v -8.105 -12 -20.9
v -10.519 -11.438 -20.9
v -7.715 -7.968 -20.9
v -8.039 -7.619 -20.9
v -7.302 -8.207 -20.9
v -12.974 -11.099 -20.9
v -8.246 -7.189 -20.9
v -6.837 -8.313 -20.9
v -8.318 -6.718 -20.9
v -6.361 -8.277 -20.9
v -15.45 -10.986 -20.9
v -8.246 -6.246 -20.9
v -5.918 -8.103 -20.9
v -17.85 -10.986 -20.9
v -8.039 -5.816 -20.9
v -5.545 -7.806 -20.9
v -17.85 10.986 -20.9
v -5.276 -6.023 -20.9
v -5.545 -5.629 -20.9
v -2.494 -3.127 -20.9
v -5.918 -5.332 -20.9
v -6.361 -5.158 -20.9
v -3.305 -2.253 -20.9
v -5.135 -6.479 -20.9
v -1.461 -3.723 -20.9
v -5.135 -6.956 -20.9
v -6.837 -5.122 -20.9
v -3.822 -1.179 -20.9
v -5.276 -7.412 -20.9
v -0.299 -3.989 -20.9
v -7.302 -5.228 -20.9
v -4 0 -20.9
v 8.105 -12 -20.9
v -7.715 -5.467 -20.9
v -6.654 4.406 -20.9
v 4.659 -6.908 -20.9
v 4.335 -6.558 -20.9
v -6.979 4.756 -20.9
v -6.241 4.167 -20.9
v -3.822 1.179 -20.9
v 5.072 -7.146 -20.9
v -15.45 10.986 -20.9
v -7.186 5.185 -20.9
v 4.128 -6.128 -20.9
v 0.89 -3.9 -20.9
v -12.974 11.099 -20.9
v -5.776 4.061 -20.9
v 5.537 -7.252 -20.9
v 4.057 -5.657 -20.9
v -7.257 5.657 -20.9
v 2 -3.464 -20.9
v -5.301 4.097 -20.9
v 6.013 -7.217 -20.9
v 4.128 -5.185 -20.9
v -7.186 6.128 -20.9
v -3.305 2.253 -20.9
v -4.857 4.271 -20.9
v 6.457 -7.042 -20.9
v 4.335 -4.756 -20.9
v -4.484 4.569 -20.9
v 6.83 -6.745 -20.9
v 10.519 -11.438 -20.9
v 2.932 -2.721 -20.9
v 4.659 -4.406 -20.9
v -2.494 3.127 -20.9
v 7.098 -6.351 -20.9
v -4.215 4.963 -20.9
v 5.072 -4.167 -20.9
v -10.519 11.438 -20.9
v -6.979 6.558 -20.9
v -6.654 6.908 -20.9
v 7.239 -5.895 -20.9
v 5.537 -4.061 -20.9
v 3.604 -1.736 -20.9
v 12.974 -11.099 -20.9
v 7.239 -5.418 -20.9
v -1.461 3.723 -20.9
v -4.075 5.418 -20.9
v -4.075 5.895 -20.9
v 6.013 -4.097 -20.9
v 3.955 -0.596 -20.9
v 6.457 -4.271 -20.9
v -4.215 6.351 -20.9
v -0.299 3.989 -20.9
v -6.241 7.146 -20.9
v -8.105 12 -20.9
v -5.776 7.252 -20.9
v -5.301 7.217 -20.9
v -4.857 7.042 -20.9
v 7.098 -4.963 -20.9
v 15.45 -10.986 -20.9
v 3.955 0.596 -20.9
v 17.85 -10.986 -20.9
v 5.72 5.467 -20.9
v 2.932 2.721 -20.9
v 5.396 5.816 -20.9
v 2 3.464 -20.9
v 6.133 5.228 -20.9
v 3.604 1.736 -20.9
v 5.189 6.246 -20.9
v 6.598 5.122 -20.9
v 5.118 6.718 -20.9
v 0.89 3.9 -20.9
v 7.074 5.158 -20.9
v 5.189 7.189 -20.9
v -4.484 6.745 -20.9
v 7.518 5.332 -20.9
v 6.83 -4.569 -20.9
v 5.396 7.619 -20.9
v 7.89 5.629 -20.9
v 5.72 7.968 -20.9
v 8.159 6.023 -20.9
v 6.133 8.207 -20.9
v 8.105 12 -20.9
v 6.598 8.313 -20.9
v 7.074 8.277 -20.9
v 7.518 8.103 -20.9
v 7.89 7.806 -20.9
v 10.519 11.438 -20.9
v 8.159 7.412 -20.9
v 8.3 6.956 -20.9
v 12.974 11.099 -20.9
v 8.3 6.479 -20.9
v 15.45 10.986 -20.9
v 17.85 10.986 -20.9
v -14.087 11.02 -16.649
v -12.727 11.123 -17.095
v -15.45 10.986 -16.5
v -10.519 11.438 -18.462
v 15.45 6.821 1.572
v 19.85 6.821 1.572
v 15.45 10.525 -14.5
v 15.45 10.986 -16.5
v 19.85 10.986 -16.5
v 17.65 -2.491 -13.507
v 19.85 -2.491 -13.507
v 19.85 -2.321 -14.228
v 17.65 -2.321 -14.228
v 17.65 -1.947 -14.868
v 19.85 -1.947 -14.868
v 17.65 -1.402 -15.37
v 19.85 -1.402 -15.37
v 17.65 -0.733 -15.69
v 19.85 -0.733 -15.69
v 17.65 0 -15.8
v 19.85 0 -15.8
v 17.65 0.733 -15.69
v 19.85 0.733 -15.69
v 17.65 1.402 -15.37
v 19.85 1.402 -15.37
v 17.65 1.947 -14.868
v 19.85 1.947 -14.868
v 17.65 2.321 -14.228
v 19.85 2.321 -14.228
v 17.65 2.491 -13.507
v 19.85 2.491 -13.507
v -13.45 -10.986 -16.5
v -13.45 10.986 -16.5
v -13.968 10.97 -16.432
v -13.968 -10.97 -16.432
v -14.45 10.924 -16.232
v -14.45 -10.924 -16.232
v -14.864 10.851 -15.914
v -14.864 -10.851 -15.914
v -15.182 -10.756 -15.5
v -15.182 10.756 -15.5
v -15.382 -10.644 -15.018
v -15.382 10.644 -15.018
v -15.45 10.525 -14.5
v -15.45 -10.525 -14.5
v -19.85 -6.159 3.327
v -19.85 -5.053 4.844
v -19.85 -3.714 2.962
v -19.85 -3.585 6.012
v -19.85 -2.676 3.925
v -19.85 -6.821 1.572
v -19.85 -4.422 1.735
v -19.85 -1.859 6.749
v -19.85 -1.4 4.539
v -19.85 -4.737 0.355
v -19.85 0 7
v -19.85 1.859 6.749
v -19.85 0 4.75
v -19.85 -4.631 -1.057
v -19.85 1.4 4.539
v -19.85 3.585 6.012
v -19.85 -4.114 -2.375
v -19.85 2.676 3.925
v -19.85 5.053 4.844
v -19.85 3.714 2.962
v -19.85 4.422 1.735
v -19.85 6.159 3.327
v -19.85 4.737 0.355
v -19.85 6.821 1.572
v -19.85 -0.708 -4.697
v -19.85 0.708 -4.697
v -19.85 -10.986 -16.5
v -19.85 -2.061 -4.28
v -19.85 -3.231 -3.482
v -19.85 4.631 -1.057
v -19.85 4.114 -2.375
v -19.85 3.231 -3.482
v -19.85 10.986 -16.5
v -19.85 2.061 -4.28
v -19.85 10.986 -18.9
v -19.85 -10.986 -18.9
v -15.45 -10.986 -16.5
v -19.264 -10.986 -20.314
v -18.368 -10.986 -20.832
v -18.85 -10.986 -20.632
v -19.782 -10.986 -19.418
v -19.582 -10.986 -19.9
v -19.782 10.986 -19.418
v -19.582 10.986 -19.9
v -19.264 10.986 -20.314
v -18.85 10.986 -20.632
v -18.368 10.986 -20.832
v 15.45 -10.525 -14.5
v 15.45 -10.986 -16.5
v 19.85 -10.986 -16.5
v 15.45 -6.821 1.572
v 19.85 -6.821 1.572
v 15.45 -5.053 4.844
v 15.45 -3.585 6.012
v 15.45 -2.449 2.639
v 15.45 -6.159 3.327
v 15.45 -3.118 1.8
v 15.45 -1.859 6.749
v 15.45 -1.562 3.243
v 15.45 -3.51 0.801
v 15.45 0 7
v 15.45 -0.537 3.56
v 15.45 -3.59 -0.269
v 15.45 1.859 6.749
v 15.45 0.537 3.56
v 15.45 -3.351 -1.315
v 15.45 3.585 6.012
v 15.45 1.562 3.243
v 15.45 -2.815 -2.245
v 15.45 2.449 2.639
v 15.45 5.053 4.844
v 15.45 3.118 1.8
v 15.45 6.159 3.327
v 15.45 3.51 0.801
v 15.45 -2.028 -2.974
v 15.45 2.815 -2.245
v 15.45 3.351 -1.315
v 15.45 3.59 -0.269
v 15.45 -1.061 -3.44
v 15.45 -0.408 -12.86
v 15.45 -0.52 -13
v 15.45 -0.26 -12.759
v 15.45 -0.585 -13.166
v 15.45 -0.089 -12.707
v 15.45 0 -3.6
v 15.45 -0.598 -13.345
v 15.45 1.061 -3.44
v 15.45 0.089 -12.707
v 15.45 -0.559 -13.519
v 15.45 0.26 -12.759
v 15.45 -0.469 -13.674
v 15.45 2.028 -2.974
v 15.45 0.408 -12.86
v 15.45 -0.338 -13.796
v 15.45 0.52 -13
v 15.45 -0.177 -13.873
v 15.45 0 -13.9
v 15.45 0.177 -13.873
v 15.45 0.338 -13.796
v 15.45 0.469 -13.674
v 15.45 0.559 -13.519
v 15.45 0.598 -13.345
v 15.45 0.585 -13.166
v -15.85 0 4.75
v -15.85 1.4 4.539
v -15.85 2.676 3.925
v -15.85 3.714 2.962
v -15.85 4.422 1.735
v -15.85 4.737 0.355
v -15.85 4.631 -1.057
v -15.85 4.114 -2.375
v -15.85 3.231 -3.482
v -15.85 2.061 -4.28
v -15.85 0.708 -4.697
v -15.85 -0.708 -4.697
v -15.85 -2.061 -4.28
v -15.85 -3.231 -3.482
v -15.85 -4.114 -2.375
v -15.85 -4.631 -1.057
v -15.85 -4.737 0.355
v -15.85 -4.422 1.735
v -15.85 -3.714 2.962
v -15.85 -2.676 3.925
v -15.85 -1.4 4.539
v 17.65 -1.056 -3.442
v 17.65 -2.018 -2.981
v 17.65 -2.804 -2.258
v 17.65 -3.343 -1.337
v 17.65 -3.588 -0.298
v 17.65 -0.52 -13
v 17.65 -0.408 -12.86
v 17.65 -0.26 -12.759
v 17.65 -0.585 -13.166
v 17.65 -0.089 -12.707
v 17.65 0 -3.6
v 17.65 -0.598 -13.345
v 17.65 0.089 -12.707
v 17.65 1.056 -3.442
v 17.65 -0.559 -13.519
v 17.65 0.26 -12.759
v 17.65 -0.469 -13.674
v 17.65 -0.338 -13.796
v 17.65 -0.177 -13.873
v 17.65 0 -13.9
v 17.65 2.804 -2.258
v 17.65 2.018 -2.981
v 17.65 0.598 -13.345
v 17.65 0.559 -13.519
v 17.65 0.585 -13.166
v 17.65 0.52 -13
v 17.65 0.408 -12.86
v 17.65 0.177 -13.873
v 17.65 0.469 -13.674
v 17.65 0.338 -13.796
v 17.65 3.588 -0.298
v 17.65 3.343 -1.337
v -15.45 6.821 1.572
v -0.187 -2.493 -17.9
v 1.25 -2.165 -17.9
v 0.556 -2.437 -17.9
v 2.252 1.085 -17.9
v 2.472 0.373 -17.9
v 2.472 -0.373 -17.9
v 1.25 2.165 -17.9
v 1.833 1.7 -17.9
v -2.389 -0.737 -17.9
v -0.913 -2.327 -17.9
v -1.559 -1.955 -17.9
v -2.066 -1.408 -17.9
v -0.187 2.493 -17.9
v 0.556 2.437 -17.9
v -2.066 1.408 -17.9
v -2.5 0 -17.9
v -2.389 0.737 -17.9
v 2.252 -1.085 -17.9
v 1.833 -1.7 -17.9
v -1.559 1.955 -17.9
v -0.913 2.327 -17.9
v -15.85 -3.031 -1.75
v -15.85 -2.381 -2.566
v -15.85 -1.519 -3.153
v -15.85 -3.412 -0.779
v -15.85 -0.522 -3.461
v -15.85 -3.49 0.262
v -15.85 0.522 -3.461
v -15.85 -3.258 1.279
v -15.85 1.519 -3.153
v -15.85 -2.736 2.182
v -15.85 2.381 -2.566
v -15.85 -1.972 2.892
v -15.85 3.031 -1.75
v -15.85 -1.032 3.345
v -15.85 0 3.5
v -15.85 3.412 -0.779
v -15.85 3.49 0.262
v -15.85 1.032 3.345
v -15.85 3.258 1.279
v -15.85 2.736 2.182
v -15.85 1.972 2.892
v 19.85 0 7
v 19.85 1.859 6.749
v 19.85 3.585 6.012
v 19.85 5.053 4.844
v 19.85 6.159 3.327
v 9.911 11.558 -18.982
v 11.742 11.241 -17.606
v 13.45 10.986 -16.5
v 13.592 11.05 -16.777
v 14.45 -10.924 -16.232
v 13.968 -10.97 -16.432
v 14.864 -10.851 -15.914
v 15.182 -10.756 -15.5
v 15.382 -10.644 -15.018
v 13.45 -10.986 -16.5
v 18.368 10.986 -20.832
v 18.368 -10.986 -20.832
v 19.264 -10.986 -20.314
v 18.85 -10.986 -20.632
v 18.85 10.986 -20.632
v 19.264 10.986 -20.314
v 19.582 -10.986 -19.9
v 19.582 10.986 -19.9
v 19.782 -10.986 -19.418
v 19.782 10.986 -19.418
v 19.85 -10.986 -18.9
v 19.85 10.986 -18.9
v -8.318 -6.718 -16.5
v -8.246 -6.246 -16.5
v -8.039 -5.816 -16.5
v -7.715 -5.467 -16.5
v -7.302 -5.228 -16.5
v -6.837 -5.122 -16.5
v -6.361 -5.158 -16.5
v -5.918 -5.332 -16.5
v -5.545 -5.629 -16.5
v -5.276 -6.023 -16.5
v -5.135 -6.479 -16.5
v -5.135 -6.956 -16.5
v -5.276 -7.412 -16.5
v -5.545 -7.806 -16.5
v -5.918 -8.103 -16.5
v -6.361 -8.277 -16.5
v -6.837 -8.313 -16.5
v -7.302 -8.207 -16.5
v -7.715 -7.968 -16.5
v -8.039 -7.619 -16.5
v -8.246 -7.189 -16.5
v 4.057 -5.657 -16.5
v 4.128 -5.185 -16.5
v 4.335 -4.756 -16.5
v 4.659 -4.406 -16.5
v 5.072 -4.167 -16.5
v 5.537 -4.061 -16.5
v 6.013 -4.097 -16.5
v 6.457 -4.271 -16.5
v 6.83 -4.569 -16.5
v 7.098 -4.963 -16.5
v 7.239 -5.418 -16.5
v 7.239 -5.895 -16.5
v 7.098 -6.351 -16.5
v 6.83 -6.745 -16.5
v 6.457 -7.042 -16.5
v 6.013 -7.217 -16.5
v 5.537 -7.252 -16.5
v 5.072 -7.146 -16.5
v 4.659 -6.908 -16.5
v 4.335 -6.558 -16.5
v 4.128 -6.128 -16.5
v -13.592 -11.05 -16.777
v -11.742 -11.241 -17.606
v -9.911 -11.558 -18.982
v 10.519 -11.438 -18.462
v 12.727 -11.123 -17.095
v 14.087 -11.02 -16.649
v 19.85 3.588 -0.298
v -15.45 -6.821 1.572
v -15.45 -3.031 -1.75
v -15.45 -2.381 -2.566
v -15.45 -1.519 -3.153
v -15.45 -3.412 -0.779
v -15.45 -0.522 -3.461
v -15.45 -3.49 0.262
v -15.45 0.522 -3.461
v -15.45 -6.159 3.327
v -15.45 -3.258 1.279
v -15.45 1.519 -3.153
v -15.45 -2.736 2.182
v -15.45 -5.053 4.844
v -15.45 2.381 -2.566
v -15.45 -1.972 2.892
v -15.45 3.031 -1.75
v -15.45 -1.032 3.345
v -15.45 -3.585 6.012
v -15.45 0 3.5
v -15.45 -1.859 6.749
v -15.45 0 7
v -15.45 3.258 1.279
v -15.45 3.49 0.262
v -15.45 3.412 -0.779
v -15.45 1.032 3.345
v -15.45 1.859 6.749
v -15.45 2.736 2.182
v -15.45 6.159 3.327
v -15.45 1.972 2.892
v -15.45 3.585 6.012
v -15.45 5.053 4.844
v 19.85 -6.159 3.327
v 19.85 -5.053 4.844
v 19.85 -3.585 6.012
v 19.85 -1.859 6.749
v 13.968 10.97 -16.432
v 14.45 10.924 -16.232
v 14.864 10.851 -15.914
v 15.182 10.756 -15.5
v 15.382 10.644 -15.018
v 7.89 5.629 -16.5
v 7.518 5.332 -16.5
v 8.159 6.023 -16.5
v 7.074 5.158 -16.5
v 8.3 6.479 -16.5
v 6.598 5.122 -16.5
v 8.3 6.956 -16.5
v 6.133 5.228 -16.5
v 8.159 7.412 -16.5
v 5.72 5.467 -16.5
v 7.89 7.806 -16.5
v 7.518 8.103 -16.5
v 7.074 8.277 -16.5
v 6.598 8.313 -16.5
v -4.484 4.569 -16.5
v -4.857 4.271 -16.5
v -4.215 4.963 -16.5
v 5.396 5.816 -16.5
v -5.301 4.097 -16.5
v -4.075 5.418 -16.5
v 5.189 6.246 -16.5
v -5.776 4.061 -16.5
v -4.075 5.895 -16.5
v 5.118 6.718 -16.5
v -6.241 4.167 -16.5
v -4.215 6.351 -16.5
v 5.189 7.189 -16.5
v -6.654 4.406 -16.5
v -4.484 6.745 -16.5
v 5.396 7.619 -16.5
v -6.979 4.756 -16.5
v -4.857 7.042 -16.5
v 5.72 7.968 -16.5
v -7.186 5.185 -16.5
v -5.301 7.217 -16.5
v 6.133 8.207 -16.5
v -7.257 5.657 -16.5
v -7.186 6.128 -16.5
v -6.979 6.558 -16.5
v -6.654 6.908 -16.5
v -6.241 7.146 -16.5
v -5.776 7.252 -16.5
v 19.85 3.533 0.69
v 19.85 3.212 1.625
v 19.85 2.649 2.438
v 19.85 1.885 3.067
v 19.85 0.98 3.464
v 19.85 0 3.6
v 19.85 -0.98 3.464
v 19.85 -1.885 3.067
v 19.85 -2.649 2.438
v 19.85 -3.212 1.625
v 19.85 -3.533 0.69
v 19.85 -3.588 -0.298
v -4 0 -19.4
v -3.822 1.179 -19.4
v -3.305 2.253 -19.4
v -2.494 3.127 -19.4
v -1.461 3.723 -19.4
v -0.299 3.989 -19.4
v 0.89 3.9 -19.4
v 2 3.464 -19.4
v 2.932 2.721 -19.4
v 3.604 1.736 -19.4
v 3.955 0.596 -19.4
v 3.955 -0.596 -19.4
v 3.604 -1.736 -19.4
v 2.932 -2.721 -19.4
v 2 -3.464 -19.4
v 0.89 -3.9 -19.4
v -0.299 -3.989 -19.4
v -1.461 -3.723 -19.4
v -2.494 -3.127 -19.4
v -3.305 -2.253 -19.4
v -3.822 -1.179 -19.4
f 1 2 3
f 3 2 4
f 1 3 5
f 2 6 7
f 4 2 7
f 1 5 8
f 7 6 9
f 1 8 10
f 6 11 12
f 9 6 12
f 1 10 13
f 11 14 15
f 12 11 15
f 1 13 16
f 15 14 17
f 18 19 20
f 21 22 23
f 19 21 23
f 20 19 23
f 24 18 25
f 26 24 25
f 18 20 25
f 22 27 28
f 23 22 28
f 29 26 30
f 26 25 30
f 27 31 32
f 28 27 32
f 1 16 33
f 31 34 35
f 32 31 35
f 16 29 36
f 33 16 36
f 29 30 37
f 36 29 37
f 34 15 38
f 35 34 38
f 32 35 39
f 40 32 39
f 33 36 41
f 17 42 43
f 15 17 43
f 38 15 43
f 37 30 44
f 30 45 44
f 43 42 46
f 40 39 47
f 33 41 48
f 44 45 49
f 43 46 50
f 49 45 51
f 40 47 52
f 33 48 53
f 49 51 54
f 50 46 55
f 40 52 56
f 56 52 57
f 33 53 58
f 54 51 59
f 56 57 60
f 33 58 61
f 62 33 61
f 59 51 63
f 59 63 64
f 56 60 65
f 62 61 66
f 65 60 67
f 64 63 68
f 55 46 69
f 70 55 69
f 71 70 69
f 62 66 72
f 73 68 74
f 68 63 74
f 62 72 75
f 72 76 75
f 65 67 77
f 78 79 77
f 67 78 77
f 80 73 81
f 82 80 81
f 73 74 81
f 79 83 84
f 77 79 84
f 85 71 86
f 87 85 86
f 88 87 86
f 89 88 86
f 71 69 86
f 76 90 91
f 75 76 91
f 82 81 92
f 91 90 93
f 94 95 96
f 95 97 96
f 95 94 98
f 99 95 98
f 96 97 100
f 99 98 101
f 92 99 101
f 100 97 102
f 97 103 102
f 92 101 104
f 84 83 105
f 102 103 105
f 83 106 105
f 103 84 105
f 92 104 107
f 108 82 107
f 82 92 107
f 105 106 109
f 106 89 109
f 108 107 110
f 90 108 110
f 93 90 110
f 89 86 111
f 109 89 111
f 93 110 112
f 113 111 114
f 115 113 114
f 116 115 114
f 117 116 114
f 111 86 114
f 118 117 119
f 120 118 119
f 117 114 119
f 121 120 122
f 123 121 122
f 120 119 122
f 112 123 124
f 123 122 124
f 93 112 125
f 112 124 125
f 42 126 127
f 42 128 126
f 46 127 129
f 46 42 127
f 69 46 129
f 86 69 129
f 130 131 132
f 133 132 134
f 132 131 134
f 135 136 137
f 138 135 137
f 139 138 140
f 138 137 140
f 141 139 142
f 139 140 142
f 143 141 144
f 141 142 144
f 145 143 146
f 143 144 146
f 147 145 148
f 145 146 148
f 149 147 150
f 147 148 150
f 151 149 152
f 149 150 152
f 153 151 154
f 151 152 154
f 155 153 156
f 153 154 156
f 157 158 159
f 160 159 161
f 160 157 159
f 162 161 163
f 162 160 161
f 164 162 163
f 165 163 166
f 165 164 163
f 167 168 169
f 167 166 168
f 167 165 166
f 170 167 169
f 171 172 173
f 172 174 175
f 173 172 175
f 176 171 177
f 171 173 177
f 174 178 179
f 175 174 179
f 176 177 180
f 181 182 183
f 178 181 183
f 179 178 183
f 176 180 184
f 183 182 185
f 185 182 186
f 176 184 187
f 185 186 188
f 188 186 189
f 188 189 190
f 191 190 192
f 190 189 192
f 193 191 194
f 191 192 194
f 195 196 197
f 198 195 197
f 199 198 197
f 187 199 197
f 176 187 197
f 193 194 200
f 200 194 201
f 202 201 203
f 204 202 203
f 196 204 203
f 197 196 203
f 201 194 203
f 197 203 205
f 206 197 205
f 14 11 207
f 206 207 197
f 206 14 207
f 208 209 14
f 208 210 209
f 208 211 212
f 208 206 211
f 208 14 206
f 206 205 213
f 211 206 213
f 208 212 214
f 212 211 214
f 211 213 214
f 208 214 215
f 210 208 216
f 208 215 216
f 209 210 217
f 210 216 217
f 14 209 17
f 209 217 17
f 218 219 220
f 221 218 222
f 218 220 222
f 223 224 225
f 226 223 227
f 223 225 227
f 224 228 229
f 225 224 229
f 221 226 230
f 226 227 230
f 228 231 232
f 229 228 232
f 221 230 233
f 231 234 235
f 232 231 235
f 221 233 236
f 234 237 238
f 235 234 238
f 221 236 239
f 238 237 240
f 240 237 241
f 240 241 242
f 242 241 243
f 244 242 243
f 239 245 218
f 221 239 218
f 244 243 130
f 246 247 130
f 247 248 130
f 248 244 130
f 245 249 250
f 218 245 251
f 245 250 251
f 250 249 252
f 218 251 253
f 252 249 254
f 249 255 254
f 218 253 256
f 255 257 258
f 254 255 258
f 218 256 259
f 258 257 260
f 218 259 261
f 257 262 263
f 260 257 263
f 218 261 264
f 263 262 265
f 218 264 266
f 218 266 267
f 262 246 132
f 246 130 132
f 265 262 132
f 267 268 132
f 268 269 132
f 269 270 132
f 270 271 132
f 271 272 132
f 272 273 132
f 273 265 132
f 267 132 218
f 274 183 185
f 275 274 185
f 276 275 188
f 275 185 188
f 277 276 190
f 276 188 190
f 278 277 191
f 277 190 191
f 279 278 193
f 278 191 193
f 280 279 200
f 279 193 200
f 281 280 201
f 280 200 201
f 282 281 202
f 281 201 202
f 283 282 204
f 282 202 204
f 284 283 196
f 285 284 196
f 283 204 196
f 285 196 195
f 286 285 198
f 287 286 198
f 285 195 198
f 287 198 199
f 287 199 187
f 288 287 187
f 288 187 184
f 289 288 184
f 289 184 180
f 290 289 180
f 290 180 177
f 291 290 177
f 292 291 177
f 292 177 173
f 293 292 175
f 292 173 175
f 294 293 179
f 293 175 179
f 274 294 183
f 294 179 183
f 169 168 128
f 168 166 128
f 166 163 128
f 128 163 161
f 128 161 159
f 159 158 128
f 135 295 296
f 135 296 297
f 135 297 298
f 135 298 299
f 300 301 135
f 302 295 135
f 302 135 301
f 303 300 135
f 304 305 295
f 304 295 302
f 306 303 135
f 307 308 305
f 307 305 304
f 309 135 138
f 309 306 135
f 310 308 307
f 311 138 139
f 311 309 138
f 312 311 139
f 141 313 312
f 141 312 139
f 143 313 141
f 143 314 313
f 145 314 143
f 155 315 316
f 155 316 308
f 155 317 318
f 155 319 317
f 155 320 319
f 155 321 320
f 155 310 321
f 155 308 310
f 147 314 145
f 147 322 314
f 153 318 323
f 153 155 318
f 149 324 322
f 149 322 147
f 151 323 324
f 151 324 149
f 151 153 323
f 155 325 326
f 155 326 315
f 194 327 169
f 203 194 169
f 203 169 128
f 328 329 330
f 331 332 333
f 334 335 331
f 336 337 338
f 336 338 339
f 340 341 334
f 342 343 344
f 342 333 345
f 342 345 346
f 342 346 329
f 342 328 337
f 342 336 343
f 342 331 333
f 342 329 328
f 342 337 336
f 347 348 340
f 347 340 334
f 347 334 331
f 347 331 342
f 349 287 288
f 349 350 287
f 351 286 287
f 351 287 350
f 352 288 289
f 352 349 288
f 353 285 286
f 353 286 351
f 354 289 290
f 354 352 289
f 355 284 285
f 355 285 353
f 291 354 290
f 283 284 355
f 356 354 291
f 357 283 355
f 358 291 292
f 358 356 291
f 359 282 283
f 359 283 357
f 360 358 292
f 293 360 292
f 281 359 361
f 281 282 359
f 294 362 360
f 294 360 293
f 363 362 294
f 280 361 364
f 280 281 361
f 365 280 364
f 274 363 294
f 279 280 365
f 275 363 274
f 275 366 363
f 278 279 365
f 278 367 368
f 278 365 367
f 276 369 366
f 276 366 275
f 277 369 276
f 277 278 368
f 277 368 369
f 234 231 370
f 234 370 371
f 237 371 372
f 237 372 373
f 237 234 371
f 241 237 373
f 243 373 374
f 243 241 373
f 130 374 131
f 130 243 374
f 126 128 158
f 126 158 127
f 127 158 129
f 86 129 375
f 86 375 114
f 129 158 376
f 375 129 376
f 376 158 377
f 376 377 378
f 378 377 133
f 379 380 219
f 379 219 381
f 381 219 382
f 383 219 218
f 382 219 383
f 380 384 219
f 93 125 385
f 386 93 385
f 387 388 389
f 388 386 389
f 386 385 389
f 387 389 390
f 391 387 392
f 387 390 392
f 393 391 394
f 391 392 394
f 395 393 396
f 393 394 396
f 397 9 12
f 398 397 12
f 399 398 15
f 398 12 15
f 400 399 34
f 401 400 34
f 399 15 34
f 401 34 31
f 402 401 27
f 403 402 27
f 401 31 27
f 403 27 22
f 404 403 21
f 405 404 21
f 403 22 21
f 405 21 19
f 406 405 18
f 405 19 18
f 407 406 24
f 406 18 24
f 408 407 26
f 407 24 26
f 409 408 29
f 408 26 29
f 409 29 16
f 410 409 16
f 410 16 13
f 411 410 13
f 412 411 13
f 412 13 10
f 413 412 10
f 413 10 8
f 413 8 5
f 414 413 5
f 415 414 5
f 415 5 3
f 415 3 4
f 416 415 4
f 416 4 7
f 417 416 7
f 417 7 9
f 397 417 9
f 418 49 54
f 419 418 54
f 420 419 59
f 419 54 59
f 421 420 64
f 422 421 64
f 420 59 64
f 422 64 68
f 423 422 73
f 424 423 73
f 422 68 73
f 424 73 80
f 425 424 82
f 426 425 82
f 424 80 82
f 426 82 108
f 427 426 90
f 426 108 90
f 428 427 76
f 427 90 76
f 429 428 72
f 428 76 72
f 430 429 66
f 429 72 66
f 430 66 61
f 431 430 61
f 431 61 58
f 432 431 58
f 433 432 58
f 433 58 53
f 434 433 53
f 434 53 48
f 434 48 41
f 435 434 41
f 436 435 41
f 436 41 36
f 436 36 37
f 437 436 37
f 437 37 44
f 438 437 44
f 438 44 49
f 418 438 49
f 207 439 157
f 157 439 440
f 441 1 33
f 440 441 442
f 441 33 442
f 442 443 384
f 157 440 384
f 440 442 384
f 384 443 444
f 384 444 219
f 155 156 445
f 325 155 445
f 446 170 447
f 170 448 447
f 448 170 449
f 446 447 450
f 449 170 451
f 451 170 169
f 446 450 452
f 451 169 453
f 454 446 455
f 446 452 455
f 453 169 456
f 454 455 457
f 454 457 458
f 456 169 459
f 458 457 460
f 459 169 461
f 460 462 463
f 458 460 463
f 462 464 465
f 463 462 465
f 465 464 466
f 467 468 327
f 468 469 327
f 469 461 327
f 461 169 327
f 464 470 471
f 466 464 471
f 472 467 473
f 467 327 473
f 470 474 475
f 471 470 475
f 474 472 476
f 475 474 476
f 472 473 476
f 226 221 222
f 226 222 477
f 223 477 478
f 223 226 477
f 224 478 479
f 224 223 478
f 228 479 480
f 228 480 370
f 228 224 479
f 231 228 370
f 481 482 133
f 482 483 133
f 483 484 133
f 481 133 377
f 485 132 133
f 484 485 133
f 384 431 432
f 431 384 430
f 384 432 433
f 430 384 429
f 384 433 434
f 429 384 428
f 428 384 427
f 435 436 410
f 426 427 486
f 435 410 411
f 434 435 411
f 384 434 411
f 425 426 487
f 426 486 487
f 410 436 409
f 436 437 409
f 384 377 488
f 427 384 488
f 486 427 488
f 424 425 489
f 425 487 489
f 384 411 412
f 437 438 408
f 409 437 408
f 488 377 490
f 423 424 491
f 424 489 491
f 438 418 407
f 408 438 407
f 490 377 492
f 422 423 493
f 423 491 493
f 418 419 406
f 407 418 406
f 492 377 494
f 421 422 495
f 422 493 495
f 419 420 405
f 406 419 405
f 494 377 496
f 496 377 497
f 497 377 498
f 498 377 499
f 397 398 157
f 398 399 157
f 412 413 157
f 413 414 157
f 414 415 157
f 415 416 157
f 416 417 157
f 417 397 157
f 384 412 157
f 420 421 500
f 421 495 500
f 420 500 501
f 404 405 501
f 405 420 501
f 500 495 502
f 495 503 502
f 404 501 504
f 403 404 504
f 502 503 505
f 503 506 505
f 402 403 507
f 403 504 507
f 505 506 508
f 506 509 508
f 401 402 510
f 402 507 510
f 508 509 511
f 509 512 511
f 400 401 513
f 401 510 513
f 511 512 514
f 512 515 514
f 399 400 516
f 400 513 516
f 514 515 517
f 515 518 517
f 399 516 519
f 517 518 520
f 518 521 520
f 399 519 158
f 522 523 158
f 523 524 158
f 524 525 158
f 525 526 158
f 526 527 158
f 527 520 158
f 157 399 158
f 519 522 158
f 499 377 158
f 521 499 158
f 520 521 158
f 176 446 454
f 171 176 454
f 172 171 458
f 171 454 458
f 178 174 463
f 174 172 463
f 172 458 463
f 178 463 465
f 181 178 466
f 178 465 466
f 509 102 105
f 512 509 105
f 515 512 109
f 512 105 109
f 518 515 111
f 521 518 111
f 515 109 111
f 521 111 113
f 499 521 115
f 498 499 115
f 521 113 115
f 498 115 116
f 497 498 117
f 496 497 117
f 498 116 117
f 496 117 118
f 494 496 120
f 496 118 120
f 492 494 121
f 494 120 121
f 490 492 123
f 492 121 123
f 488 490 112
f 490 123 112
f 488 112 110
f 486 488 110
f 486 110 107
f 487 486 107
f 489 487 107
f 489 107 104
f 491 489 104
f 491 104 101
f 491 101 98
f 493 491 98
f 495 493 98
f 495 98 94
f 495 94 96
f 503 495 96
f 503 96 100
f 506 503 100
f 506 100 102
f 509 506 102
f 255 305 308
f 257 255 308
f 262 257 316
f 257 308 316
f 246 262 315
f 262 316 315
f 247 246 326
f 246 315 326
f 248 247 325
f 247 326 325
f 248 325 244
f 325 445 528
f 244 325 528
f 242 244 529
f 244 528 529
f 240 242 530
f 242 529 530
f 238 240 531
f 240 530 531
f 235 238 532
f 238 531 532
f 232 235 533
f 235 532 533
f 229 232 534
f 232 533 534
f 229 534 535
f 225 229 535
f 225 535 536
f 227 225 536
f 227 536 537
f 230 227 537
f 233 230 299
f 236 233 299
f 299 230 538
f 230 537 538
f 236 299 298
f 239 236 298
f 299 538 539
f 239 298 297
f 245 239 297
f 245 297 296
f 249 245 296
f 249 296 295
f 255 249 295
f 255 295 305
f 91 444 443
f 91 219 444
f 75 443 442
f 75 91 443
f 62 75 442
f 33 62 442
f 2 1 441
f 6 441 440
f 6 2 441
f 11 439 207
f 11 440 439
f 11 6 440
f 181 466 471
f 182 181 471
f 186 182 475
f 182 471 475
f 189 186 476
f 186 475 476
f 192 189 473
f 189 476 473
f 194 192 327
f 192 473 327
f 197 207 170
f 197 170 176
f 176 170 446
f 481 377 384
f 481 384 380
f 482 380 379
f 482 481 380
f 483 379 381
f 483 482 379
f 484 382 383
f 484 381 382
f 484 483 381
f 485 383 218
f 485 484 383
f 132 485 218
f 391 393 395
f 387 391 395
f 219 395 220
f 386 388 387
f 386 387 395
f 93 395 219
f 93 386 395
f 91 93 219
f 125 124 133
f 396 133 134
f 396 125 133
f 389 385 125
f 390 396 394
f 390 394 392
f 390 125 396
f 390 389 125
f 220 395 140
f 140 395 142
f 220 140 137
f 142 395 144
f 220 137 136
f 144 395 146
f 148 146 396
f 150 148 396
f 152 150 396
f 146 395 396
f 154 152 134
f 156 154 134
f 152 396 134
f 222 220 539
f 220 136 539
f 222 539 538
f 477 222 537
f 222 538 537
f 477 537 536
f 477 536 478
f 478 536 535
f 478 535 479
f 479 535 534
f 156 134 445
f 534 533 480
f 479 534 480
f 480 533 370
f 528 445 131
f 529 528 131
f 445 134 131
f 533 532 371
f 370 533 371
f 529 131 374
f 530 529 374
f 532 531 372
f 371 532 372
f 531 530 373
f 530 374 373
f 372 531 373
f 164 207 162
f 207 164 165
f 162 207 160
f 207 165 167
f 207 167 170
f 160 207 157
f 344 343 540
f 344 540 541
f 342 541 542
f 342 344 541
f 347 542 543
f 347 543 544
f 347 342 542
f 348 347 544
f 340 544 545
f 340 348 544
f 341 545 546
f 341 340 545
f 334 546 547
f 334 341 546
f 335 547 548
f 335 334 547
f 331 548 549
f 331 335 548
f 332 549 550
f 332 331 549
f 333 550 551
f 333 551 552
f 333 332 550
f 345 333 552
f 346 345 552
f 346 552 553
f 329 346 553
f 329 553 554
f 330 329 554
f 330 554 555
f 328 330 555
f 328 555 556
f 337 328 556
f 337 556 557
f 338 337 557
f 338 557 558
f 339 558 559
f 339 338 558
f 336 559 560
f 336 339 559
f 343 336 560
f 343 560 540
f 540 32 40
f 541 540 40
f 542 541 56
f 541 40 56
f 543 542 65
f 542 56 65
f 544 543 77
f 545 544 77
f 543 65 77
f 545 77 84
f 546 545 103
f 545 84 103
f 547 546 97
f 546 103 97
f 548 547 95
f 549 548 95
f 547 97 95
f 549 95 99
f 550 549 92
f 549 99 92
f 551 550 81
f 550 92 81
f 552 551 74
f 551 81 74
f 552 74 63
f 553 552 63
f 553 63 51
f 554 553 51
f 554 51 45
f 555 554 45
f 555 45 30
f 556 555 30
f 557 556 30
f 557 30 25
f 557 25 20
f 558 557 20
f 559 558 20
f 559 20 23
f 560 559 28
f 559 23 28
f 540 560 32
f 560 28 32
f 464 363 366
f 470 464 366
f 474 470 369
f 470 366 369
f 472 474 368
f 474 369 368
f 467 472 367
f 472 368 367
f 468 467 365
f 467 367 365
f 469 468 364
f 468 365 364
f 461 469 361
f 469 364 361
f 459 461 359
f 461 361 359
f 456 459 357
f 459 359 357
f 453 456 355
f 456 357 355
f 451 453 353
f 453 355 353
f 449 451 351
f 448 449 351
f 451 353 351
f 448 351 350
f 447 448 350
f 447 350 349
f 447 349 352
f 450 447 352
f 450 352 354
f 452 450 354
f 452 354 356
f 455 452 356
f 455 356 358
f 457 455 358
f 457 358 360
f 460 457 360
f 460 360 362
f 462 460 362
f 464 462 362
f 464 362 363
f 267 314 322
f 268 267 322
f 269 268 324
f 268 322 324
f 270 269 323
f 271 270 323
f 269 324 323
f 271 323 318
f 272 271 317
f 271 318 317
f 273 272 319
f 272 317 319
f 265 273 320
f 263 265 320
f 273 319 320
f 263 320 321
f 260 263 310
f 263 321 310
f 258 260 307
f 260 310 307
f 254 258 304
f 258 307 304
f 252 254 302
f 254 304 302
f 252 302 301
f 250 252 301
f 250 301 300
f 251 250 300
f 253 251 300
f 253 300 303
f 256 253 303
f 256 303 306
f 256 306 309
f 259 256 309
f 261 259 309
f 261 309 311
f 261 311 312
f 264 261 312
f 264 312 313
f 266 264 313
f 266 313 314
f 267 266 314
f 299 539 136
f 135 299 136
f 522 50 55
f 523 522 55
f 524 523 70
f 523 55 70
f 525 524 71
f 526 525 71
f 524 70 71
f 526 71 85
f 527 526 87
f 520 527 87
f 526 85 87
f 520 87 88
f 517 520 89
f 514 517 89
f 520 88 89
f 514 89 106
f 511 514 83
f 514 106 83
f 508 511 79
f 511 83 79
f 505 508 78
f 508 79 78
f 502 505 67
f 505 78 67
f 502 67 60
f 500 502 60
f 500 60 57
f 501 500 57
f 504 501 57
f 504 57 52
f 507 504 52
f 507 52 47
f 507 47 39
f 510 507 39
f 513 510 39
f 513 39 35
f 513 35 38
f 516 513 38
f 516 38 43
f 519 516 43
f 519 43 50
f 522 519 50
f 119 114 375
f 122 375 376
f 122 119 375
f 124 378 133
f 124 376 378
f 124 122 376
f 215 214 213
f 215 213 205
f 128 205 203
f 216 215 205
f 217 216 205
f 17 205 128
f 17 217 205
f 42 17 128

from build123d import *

# Parameters (mm, degrees)
Y_KSEKLIK_EKSTR_ZYON1_DEPTH = 14
KES_EKSTR_ZYON1_DEPTH       = 33.044227249
KES_EKSTR_ZYON3_DEPTH       = 33.044227249
KES_EKSTR_ZYON4_START       = -4.4
KES_EKSTR_ZYON4_DEPTH       = 4.4
KES_EKSTR_ZYON6_REACH       = 48.442
IZIM6_R                     = 3.6
IZIM5_R                     = 1.6
KES_EKSTR_ZYON5_DEPTH       = 37.282674929
KES_EKSTR_ZYON7_DEPTH       = 2.2
KES_EKSTR_ZYON8_REACH       = 46.576
IZIM7_R                     = 0.6
KES_EKSTR_ZYON10_REACH      = 48.442
IZIM9_R                     = 3.5
IZIM9_3_R                   = 4.75
IZIM9_3_R_2                 = 3.5
KES_EKSTR_ZYON11_DEPTH      = 4
RADYUS1_R                   = 2
IZIM5_3_R                   = 4
KES_EKSTR_ZYON12_DEPTH      = 3
PAH1_SIZE                   = 1.5


# Read off the part's stored shape, not the designer's step: Kes-Ekstrüzyon4
with BuildPart() as part:
    # Çizim1 → Yükseklik-Ekstrüzyon1 (new, symmetric)
    with BuildSketch(Plane(origin=(0, 0, 0), x_dir=(1, 0, 0), z_dir=(0, 1, 0))):
        Polygon((-19.85, -7), (-19.85, 20.9), (19.85, 20.9), (19.85, -7), (15.45, -7), (15.45, 16.5), (-15.45, 16.5), (-15.45, -7), align=None)
    extrude(amount=Y_KSEKLIK_EKSTR_ZYON1_DEPTH, both=True)

    # Çizim2 → Kes-Ekstrüzyon1 (cut, through all)
    with BuildSketch(Plane(origin=(0, 0, 0), x_dir=(0, 0, -1), z_dir=(1, 0, 0))):
        with BuildLine():
            Line((20.9, -12), (-1.571984828, -6.821206909))
            ThreePointArc((-1.571984828, -6.821206909), (-5.477403299, -4.358675613), (-7, 0))
            Line((-7, 0), (-7, -14))
            Line((-7, -14), (20.9, -14))
            Line((20.9, -14), (20.9, -12))
        make_face()
        with BuildLine():
            Line((-7, 14), (-7, 0))
            ThreePointArc((-7, 0), (-5.477403299, 4.358675613), (-1.571984828, 6.821206909))
            Line((-1.571984828, 6.821206909), (20.9, 12))
            Line((20.9, 12), (20.9, 14))
            Line((20.9, 14), (-7, 14))
        make_face()
    extrude(amount=-KES_EKSTR_ZYON1_DEPTH, mode=Mode.SUBTRACT)

    # Çizim3 → Kes-Ekstrüzyon3 (cut, through all)
    with BuildSketch(Plane(origin=(0, 0, 0), x_dir=(0, 0, -1), z_dir=(1, 0, 0))):
        with BuildLine():
            ThreePointArc((-7, 3e-09), (-5.477403298, 4.358675614), (-1.571984828, 6.821206909))
            Line((-1.571984828, 6.821206909), (20.9, 12))
            Line((20.9, 12), (20.9, 14))
            Line((20.9, 14), (-7, 14))
            Line((-7, 14), (-7, 3e-09))
        make_face()
        with BuildLine():
            ThreePointArc((-1.571984828, -6.821206909), (-5.4774033, -4.358675612), (-7, 3e-09))
            Line((-7, 3e-09), (-7, -14))
            Line((-7, -14), (20.9, -14))
            Line((20.9, -14), (20.9, -12))
            Line((20.9, -12), (-1.571984828, -6.821206909))
        make_face()
    extrude(amount=KES_EKSTR_ZYON3_DEPTH, mode=Mode.SUBTRACT)

    # Kes-Ekstrüzyon4 outline → Kes-Ekstrüzyon4 (cut)
    with BuildSketch(Plane.XY.offset(-16.5).offset(KES_EKSTR_ZYON4_START)):
        with BuildLine():
            Line((-19.85, 10.985995684), (-15.45, 10.985995684))
            ThreePointArc((-15.45, 10.985995684), (-10.259984059, 11.487506015), (-5.262018305, 12.973479231))
            ThreePointArc((-5.262018305, 12.973479231), (-2.680605384, 13.740973574), (5.9e-08, 14))
            Line((5.9e-08, 14), (-19.85, 14))
            Line((-19.85, 14), (-19.85, 10.985995684))
        make_face()
        with BuildLine():
            ThreePointArc((-5.262018305, -12.973479231), (-10.259984059, -11.487506015), (-15.45, -10.985995684))
            Line((-15.45, -10.985995684), (-19.85, -10.985995684))
            Line((-19.85, -10.985995684), (-19.85, -14))
            Line((-19.85, -14), (0, -14))
            ThreePointArc((0, -14), (-2.680605414, -13.740973569), (-5.262018305, -12.973479231))
        make_face()
        with BuildLine():
            Line((19.85, 14), (5.9e-08, 14))
            ThreePointArc((5.9e-08, 14), (2.680605443, 13.740973563), (5.262018305, 12.973479231))
            ThreePointArc((5.262018305, 12.973479231), (10.259984059, 11.487506015), (15.45, 10.985995684))
            Line((15.45, 10.985995684), (19.85, 10.985995684))
            Line((19.85, 10.985995684), (19.85, 14))
        make_face()
        with BuildLine():
            ThreePointArc((5.262018305, -12.973479231), (2.680605414, -13.740973569), (0, -14))
            Line((0, -14), (19.85, -14))
            Line((19.85, -14), (19.85, -10.985995684))
            Line((19.85, -10.985995684), (15.45, -10.985995684))
            ThreePointArc((15.45, -10.985995684), (10.259984059, -11.487506015), (5.262018305, -12.973479231))
        make_face()
    extrude(amount=KES_EKSTR_ZYON4_DEPTH, mode=Mode.SUBTRACT)

    # Çizim6 → Kes-Ekstrüzyon6 (cut, up to next)
    with BuildSketch(Plane(origin=(19.85, 0, 0), x_dir=(0, 0, -1), z_dir=(1, 0, 0)), mode=Mode.PRIVATE) as kes_ekstr_zyon6_sk1:
        Circle(IZIM6_R)
    kes_ekstr_zyon6_tool1 = extrude(kes_ekstr_zyon6_sk1.sketch, amount=-KES_EKSTR_ZYON6_REACH, mode=Mode.PRIVATE) & part.part
    add(kes_ekstr_zyon6_tool1.solids().sort_by_distance((19.85, 0, 0))[0], mode=Mode.SUBTRACT)

    # Çizim5 → Kes-Ekstrüzyon5 (cut, through all)
    with BuildSketch(Plane(origin=(0, 0, -20.9), x_dir=(-1, 0, 0), z_dir=(0, 0, -1))):
        with Locations((-5.656854249, -5.656854249)):
            Circle(IZIM5_R)
        with Locations((-6.717514421, 6.717514421)):
            Circle(IZIM5_R)
        with Locations((5.656854249, 5.656854249)):
            Circle(IZIM5_R)
        with Locations((6.717514421, -6.717514421)):
            Circle(IZIM5_R)
    extrude(amount=-KES_EKSTR_ZYON5_DEPTH, mode=Mode.SUBTRACT)

    # Çizim6<3> → Kes-Ekstrüzyon7 (cut)
    with BuildSketch(Plane(origin=(19.85, 0, 0), x_dir=(0, 0, -1), z_dir=(1, 0, 0))):
        with BuildLine():
            ThreePointArc((0.297744361, 3.587666135), (3.6, 0), (0.297744361, -3.587666135))
            Line((0.297744361, -3.587666135), (13.506766917, -2.491434816))
            ThreePointArc((13.506766917, -2.491434816), (15.8, 0), (13.506766917, 2.491434816))
            Line((13.506766917, 2.491434816), (0.297744361, 3.587666135))
        make_face()
    extrude(amount=-KES_EKSTR_ZYON7_DEPTH, mode=Mode.SUBTRACT)

    # Çizim7 → Kes-Ekstrüzyon8 (cut, up to next)
    with BuildSketch(Plane(origin=(17.65, 0, 0), x_dir=(0, 0, -1), z_dir=(1, 0, 0)), mode=Mode.PRIVATE) as kes_ekstr_zyon8_sk1:
        with Locations((13.3, 0)):
            Circle(IZIM7_R)
    kes_ekstr_zyon8_tool1 = extrude(kes_ekstr_zyon8_sk1.sketch, amount=-KES_EKSTR_ZYON8_REACH, mode=Mode.PRIVATE) & part.part
    add(kes_ekstr_zyon8_tool1.solids().sort_by_distance((17.65, 0, -13.3))[0], mode=Mode.SUBTRACT)

    # Çizim9 → Kes-Ekstrüzyon10 (cut, up to next)
    with BuildSketch(Plane.ZY.offset(19.85), mode=Mode.PRIVATE) as kes_ekstr_zyon10_sk1:
        Circle(IZIM9_R)
    kes_ekstr_zyon10_tool1 = extrude(kes_ekstr_zyon10_sk1.sketch, amount=-KES_EKSTR_ZYON10_REACH, mode=Mode.PRIVATE) & part.part
    add(kes_ekstr_zyon10_tool1.solids().sort_by_distance((-19.85, 0, 0))[0], mode=Mode.SUBTRACT)

    # Çizim9<3> → Kes-Ekstrüzyon11 (cut)
    with BuildSketch(Plane.ZY.offset(19.85)):
        Circle(IZIM9_3_R)
        Circle(IZIM9_3_R_2, mode=Mode.SUBTRACT)
    extrude(amount=-KES_EKSTR_ZYON11_DEPTH, mode=Mode.SUBTRACT)

    # Radyus1
    # the kernel refuses this fillet: 2 mm, written as the material it adds along each edge
    with BuildSketch(Plane(origin=(-15.45, -15.985995684, -16.5), x_dir=(0, 0, 1), z_dir=(0, 1, 0))) as radyus1_piece_1_section:
        with BuildLine():
            CenterArc((RADYUS1_R, RADYUS1_R), RADYUS1_R, 180, 90)
            Line((0, RADYUS1_R), (0, 0))
            Line((0, 0), (RADYUS1_R, 0))
        make_face()
    radyus1_piece_1 = extrude(amount=31.971991369, mode=Mode.PRIVATE)
    radyus1_piece_1 = split(radyus1_piece_1, bisect_by=Plane(origin=(-14.994883818, 10.333733048, -13.66968108), z_dir=(0, -0.9744581299008602, -0.22456926118709647)), keep=Keep.TOP, mode=Mode.PRIVATE)
    radyus1_piece_1 = split(radyus1_piece_1, bisect_by=Plane(origin=(-14.994883818, -10.333733048, -13.66968108), z_dir=(0, 0.9744581299008602, -0.22456926118709647)), keep=Keep.TOP, mode=Mode.PRIVATE)
    add(radyus1_piece_1)
    with BuildSketch(Plane(origin=(15.45, 15.985995684, -16.5), x_dir=(-1, 0, 0), z_dir=(0, -1, 0))) as radyus1_piece_2_section:
        with BuildLine():
            CenterArc((RADYUS1_R, -RADYUS1_R), RADYUS1_R, 90, 90)
            Line((0, -RADYUS1_R), (0, 0))
            Line((0, 0), (RADYUS1_R, 0))
        make_face()
    radyus1_piece_2 = extrude(amount=31.971991369, mode=Mode.PRIVATE)
    radyus1_piece_2 = split(radyus1_piece_2, bisect_by=Plane(origin=(14.994883818, -10.333733048, -13.66968108), z_dir=(0, 0.9744581299008602, -0.22456926118709647)), keep=Keep.TOP, mode=Mode.PRIVATE)
    radyus1_piece_2 = split(radyus1_piece_2, bisect_by=Plane(origin=(14.994883818, 10.333733048, -13.66968108), z_dir=(0, -0.9744581299008602, -0.22456926118709647)), keep=Keep.TOP, mode=Mode.PRIVATE)
    add(radyus1_piece_2)
    # the kernel refuses this fillet: 2 mm, written as the material it takes off along each edge
    with BuildSketch(Plane(origin=(-19.85, 15.985995684, -20.9), x_dir=(0, 0, 1), z_dir=(0, -1, 0)), Plane(origin=(19.85, 15.985995684, -20.9), x_dir=(-1, 0, 0), z_dir=(0, -1, 0))) as radyus1_2_piece_1:
        with BuildLine():
            CenterArc((RADYUS1_R, -RADYUS1_R), RADYUS1_R, 90, 90)
            Line((0, -RADYUS1_R), (0, 0))
            Line((0, 0), (RADYUS1_R, 0))
        make_face()
    extrude(amount=31.971991368, mode=Mode.SUBTRACT)

    # Çizim5<3> → Kes-Ekstrüzyon12 (cut)
    with BuildSketch(Plane(origin=(0, 0, -20.9), x_dir=(-1, 0, 0), z_dir=(0, 0, -1))):
        Circle(IZIM5_3_R)
    extrude(amount=-KES_EKSTR_ZYON12_DEPTH, mode=Mode.SUBTRACT)

    # Pah1
    pah1_edges = [part.edges().sort_by_distance(p)[0] for p in [
        (4, 0, -17.9),
    ]]
    chamfer(pah1_edges, length=PAH1_SIZE)


solid = part.part
